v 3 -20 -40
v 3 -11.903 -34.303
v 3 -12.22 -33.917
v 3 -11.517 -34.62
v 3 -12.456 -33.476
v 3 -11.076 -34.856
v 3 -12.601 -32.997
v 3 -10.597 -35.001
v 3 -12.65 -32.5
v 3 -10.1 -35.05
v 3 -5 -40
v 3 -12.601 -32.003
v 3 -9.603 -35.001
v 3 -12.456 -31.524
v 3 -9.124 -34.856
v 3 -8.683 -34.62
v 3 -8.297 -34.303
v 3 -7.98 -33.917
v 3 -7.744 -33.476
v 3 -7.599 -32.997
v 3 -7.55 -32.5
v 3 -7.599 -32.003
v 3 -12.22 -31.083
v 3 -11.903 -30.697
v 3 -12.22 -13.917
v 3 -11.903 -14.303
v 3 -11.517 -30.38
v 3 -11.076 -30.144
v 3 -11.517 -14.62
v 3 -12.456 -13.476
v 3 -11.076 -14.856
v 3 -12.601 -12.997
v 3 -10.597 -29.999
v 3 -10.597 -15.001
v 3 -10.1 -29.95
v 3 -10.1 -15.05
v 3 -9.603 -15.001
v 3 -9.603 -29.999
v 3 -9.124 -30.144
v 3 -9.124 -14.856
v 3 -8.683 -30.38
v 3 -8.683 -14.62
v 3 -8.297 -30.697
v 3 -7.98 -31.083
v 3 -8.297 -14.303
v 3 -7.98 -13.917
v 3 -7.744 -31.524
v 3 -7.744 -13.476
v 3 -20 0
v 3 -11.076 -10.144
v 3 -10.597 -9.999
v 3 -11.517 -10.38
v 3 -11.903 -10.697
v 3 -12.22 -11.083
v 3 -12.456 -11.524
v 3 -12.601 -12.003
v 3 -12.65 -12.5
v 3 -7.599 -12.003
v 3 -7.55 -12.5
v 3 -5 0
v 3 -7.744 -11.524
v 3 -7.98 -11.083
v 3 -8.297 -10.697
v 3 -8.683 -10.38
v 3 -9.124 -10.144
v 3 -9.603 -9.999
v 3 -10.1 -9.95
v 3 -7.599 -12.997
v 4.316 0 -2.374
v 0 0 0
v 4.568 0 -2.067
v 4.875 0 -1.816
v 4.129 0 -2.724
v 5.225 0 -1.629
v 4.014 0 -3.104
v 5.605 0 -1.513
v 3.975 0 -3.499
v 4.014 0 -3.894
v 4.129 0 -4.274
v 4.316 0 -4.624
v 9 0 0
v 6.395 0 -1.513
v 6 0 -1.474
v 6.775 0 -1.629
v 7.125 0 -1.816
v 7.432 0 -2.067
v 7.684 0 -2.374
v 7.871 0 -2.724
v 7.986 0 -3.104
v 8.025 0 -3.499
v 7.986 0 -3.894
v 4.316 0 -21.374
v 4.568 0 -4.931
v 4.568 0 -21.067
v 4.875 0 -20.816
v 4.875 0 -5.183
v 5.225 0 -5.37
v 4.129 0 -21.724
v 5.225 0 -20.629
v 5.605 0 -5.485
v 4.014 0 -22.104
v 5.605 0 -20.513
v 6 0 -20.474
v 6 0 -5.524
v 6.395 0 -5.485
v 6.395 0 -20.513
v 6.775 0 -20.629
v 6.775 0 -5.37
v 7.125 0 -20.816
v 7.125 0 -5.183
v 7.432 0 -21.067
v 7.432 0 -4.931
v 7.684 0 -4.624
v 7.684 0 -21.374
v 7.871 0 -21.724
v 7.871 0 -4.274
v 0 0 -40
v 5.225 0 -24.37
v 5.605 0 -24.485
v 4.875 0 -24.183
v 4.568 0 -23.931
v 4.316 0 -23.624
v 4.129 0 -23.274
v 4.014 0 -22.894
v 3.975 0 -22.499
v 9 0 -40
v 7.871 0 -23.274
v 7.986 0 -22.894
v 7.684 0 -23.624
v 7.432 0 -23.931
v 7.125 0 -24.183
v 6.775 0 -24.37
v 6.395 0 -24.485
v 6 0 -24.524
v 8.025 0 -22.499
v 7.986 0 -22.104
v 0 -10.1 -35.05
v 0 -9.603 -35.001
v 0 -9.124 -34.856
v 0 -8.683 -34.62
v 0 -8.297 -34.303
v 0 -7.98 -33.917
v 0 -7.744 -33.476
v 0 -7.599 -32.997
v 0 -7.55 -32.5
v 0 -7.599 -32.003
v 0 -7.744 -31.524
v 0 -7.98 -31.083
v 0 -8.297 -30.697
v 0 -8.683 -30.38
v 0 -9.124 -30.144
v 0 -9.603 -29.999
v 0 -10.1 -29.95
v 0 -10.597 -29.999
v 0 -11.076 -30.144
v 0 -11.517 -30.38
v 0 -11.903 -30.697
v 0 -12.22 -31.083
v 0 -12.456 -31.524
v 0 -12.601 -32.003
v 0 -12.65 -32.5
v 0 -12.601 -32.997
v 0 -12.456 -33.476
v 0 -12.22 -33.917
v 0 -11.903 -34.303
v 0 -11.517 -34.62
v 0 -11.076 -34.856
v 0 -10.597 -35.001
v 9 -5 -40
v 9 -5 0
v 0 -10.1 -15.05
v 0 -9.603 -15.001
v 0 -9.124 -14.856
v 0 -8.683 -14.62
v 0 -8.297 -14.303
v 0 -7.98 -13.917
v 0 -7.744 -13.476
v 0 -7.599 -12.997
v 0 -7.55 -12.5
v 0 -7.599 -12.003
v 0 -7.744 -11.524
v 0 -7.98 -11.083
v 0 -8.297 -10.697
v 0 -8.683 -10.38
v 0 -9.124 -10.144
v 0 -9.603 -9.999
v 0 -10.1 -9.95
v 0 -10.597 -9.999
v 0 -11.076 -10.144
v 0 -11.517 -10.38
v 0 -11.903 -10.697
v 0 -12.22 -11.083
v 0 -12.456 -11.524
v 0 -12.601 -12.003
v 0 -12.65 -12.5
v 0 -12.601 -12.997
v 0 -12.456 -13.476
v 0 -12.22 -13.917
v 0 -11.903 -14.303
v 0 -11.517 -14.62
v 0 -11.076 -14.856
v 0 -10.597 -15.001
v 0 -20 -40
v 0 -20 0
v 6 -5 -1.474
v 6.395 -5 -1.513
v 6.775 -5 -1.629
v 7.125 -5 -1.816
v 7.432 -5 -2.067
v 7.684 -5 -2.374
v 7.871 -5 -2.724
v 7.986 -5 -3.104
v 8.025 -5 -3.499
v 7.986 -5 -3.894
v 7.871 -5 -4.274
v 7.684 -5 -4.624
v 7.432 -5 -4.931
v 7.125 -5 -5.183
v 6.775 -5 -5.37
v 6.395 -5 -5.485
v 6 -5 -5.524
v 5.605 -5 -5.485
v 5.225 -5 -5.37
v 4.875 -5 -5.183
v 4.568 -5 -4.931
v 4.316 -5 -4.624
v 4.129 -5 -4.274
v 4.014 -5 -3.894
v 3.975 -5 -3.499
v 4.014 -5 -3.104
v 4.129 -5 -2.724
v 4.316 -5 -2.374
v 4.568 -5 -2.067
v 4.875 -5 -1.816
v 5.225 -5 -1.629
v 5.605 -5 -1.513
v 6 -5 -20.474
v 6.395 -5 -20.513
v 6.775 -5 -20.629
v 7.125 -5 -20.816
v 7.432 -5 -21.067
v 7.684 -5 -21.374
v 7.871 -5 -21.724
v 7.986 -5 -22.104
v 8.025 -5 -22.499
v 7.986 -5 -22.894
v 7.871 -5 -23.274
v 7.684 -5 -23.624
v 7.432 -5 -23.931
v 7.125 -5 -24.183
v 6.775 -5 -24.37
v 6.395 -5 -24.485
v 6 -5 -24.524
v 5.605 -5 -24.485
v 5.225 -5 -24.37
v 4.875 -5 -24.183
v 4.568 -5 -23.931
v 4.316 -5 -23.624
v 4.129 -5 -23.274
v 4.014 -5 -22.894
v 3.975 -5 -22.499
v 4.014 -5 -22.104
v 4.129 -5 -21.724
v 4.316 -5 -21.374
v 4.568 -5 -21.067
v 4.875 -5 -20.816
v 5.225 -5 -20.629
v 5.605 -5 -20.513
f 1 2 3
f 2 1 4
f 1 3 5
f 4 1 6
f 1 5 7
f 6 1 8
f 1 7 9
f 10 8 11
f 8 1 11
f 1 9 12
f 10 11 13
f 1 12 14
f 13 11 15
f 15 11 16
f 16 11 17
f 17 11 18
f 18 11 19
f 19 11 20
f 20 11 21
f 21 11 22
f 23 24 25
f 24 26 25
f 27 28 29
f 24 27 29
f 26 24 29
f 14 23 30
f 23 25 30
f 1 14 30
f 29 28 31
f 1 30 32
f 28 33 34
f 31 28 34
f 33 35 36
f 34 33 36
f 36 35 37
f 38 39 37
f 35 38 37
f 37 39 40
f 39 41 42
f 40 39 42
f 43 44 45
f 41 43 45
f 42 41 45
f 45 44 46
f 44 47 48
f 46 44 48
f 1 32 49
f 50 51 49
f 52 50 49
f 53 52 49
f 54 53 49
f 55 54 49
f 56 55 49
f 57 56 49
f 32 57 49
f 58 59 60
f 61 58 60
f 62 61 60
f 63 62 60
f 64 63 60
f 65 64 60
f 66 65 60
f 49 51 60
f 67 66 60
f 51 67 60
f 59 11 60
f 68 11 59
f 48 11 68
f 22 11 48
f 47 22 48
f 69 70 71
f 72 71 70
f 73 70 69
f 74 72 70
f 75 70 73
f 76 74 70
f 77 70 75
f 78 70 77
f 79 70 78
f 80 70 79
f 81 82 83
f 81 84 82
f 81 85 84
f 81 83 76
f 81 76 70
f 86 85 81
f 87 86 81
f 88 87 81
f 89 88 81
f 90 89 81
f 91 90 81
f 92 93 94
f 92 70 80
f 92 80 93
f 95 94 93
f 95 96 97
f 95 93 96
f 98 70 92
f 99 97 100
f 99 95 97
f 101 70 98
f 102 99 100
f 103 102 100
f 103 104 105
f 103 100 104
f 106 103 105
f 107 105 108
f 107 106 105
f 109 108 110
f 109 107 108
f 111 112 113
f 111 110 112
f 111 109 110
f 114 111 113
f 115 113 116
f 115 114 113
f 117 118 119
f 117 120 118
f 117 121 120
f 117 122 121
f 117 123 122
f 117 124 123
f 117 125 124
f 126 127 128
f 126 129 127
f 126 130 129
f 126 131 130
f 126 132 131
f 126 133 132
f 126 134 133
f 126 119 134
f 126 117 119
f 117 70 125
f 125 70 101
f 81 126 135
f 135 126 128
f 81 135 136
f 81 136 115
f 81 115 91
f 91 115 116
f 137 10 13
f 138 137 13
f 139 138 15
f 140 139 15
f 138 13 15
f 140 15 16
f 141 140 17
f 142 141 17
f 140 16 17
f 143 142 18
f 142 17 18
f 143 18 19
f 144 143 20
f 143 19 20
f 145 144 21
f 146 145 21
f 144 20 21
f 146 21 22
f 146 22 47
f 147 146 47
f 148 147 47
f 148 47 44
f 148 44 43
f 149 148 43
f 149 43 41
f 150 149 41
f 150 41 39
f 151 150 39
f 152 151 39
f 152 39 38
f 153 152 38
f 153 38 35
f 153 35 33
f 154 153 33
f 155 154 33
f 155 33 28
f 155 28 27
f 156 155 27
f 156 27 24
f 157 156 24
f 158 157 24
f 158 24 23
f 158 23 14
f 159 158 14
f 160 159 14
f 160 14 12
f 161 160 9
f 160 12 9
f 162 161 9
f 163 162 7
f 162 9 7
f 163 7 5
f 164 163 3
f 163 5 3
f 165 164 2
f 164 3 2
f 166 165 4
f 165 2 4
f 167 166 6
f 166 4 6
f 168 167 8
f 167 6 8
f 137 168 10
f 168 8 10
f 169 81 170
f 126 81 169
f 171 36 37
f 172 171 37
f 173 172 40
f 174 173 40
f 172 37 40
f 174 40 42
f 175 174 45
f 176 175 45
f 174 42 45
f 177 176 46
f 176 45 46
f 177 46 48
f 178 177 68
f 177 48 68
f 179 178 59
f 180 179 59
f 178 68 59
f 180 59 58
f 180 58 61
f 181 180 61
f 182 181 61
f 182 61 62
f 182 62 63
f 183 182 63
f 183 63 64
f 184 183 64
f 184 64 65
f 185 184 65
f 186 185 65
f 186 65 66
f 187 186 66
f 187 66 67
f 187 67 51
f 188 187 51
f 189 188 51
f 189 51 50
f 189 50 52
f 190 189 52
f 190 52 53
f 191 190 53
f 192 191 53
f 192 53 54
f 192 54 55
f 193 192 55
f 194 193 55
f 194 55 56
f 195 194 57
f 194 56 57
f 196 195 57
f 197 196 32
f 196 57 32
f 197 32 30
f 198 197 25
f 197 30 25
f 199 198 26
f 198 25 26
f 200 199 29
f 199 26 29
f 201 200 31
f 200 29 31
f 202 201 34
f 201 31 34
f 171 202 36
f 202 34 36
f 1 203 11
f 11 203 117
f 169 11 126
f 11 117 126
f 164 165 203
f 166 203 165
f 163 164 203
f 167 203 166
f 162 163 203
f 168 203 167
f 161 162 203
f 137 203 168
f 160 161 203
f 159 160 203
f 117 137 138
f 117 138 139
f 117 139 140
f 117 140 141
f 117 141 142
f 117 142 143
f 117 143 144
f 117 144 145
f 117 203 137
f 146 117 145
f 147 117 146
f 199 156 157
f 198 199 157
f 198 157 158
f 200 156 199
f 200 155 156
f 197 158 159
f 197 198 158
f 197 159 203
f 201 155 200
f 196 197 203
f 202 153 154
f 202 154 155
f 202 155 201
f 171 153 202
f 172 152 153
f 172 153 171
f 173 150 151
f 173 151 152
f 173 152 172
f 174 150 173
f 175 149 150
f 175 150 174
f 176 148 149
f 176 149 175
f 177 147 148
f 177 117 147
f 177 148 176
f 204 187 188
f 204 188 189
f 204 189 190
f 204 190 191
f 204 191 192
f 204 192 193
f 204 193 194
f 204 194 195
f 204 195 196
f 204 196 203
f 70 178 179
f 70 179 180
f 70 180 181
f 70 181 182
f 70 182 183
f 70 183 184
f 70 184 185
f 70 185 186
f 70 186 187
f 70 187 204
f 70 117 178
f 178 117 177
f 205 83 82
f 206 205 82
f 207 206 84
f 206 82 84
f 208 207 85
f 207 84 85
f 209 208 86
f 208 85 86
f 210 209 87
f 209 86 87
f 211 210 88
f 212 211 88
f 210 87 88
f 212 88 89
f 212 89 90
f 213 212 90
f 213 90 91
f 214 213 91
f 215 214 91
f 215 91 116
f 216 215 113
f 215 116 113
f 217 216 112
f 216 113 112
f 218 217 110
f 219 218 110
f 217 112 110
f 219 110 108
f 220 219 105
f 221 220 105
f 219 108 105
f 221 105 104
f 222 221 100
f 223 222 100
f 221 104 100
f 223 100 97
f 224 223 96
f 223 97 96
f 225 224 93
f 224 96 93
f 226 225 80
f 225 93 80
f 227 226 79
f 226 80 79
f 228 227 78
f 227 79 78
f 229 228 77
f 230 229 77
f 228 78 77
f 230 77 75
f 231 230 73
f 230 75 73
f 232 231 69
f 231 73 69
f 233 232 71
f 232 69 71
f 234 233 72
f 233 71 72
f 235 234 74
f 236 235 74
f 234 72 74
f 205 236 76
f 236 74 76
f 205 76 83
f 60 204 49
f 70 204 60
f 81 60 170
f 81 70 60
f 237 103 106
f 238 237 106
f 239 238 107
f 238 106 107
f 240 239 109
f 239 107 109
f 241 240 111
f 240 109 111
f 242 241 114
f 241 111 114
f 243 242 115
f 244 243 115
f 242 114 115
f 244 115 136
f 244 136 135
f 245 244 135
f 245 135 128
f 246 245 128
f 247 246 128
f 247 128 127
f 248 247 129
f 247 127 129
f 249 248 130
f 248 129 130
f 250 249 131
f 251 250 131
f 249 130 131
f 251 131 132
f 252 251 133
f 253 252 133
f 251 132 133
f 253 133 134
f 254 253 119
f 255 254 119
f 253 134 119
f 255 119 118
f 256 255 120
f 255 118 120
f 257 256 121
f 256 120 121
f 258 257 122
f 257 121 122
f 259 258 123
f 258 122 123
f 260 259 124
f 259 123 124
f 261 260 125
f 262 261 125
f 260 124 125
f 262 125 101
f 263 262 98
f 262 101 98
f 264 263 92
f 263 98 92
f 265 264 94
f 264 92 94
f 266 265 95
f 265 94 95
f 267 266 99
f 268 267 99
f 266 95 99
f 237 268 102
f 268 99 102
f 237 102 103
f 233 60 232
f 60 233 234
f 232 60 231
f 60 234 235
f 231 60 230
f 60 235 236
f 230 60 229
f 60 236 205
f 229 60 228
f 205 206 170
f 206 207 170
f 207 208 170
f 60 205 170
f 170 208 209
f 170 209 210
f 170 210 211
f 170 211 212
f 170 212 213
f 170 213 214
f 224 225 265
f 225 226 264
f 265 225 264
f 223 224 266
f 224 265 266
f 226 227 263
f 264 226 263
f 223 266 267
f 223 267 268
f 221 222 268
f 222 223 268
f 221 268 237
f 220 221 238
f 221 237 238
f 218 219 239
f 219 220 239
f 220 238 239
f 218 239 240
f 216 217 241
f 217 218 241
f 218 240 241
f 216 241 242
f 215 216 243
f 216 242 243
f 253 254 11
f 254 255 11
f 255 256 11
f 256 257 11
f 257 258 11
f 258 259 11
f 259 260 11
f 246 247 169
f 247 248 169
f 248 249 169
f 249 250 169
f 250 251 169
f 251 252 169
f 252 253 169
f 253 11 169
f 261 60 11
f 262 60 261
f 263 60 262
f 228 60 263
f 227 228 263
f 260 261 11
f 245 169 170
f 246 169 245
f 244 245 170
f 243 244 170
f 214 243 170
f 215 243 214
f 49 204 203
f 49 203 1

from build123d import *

# Parameters (mm, degrees)
SKETCH1_W           = 9
SKETCH1_H           = 40
SKETCH1_R           = 2.025
BOSS_EXTRUDE1_DEPTH = 5
SKETCH2_W           = 3
SKETCH2_H           = 40
BOSS_EXTRUDE2_DEPTH = 15
SKETCH3_R           = 2.55
CUT_EXTRUDE1_DEPTH  = 46.122056691


with BuildPart() as part:
    # Sketch1 → Boss-Extrude1 (new body)
    with BuildSketch(Plane(origin=(0, 0, 0), x_dir=(1, 0, 0), z_dir=(0, 1, 0))):
        with Locations((4.5, 20)):
            Rectangle(SKETCH1_W, SKETCH1_H)
        with Locations(Location((6, 3.499356869, 0), (0, 0, 270))):
            Circle(SKETCH1_R, mode=Mode.SUBTRACT)
        with Locations(Location((6, 22.499356869, 0), (0, 0, 270))):
            Circle(SKETCH1_R, mode=Mode.SUBTRACT)
    extrude(amount=-BOSS_EXTRUDE1_DEPTH)

    # Sketch2 → Boss-Extrude2 (add)
    with BuildSketch(Plane.XZ.offset(5)):
        with Locations((1.5, -20)):
            Rectangle(SKETCH2_W, SKETCH2_H)
    extrude(amount=BOSS_EXTRUDE2_DEPTH)

    # Sketch3 → Cut-Extrude1 (cut, through all)
    with BuildSketch(Plane(origin=(3, 0, 0), x_dir=(0, 0, -1), z_dir=(1, 0, 0))):
        with Locations((12.5, -10.1)):
            Circle(SKETCH3_R)
        with Locations((32.5, -10.1)):
            Circle(SKETCH3_R)
    extrude(amount=-CUT_EXTRUDE1_DEPTH, mode=Mode.SUBTRACT)


solid = part.part
